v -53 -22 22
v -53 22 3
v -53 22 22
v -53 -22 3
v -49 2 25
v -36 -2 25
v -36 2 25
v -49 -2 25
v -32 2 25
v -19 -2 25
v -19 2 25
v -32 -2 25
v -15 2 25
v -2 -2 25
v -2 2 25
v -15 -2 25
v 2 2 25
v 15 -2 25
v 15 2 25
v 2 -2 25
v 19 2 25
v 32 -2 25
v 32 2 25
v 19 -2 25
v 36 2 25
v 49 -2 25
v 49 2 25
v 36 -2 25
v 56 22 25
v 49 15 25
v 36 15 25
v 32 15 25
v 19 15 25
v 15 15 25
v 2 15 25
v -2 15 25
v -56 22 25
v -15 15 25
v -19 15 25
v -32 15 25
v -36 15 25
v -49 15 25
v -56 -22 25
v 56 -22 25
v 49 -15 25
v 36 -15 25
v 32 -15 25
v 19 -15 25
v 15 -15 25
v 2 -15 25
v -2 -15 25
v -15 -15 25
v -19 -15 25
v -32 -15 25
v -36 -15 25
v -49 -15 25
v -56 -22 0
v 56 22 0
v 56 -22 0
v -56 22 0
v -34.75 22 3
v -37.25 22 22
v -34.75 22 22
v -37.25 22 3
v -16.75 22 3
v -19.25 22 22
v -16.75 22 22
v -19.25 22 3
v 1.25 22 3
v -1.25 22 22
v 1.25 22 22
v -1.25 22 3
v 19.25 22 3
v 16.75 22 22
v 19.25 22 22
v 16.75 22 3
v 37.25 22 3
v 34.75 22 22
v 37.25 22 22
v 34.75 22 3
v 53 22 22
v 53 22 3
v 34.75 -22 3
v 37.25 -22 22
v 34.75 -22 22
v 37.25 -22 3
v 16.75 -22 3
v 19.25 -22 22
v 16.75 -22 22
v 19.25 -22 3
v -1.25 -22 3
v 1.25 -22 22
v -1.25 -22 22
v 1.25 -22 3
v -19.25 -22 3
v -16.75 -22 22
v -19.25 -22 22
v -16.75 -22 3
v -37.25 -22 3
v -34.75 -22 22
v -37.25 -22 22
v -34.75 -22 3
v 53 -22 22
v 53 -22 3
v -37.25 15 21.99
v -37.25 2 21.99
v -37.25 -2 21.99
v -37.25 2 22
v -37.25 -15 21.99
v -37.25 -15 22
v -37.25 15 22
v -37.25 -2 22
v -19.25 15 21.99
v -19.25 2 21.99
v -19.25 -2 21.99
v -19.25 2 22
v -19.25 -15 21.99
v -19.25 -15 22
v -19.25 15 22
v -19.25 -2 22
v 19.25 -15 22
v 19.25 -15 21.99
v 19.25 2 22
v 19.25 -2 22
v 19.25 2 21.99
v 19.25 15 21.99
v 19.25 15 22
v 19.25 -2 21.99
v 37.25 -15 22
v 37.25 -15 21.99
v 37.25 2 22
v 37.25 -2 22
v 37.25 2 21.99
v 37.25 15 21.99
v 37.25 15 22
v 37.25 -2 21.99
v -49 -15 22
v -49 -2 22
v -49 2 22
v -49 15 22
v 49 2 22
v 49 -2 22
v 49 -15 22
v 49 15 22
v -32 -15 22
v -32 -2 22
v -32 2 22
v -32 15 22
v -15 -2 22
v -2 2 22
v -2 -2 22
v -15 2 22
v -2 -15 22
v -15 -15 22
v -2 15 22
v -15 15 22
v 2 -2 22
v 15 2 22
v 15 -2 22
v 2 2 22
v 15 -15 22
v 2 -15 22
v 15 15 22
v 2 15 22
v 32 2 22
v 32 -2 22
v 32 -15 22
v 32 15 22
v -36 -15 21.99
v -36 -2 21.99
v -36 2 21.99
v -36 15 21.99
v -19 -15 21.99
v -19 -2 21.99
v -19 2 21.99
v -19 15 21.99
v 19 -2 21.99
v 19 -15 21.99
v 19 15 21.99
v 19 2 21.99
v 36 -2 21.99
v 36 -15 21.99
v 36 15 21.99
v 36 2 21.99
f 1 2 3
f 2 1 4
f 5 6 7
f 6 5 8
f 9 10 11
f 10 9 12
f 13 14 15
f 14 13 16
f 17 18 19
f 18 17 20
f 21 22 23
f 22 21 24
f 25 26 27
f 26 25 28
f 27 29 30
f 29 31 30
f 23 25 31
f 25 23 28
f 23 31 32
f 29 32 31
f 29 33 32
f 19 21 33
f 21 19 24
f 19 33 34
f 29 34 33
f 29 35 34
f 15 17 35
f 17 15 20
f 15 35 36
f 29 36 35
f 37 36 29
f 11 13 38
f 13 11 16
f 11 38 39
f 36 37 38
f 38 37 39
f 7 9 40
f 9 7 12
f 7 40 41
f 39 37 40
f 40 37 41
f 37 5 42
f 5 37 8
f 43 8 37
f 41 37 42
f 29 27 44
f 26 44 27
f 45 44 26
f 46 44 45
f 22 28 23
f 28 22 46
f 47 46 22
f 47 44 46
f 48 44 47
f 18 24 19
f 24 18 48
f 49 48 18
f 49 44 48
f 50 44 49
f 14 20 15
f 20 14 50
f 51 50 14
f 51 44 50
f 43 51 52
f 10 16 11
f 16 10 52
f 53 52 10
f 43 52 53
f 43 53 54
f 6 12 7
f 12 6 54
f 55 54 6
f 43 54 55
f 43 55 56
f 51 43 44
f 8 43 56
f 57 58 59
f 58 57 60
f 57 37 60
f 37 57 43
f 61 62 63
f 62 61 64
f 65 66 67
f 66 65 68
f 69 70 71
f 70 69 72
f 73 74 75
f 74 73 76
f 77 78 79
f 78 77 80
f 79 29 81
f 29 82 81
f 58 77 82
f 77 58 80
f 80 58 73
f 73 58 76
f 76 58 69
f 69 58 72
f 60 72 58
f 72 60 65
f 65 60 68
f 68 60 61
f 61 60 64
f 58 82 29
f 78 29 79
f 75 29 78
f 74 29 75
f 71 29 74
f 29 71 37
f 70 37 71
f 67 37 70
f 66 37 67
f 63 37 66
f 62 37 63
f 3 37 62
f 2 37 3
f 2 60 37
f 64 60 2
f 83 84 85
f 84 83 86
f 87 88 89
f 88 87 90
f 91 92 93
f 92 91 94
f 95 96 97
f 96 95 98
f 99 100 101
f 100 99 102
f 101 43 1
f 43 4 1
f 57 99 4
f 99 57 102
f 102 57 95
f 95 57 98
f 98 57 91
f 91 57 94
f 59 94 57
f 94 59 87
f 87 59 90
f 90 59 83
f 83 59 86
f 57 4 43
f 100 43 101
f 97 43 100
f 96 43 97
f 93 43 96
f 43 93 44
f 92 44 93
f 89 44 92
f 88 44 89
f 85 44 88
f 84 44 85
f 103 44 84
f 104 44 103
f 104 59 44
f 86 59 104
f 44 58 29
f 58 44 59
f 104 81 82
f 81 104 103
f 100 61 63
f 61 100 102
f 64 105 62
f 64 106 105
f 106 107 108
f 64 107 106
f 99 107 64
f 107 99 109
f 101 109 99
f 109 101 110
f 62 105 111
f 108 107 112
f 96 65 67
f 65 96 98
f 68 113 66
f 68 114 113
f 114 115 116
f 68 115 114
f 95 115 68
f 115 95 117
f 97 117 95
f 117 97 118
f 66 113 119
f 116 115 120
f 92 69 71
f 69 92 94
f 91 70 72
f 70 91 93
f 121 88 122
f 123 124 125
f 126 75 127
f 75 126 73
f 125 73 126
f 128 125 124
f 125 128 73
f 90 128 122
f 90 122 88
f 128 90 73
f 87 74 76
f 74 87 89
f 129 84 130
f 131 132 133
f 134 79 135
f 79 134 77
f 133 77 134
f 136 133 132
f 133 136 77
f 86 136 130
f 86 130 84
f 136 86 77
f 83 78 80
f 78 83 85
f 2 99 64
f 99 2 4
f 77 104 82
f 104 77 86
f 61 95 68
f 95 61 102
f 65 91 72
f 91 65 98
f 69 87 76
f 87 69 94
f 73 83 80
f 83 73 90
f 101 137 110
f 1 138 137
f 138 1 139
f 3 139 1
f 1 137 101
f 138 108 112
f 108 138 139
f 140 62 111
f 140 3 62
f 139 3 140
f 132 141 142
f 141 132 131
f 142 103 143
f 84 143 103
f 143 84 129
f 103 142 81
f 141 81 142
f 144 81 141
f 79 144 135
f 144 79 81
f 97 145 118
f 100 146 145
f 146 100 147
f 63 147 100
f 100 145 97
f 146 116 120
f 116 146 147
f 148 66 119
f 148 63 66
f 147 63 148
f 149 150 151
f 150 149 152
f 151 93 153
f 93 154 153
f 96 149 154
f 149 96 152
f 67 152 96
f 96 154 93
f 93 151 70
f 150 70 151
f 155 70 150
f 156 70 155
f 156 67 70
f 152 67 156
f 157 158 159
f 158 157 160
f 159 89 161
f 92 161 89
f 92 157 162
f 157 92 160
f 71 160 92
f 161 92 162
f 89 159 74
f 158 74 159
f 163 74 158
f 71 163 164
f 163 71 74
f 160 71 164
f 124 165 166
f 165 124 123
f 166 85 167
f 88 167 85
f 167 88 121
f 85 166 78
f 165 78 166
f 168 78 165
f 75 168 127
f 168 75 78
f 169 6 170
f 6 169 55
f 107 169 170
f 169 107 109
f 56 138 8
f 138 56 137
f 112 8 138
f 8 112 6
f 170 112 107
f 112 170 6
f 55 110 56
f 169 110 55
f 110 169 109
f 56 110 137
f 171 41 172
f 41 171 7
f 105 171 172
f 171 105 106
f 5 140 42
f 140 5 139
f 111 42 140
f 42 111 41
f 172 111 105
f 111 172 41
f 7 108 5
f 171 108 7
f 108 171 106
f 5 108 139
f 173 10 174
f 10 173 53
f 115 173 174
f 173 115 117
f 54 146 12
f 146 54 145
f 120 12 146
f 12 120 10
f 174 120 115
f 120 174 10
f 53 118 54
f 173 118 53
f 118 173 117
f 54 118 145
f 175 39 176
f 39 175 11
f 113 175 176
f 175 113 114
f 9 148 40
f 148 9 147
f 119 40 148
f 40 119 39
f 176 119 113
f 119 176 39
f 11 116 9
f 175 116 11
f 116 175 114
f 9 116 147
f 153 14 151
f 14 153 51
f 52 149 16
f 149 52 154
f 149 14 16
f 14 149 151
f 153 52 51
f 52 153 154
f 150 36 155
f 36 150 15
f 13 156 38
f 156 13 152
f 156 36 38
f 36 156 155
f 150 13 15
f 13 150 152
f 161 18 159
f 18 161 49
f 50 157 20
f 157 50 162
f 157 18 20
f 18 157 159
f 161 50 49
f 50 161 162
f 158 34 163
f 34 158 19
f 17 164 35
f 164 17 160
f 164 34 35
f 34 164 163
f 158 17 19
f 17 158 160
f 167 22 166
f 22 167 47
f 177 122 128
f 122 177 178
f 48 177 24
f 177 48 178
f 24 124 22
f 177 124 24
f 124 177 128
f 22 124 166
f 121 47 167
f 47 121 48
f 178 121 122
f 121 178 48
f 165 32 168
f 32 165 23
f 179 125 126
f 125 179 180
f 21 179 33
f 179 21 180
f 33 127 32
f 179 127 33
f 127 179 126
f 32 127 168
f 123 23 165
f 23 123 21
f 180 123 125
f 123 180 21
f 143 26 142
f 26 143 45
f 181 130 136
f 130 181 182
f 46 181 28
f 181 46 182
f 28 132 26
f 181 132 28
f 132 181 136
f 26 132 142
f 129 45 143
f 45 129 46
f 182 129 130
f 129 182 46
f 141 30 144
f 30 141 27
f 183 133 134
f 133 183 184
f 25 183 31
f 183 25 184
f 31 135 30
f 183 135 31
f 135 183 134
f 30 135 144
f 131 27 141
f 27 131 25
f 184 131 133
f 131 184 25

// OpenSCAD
// KNOWN-WRONG PART (must fail): the holes are 17 mm apart instead of 18
// Open-sided rack for 12 standard 12.5 mm square cuvettes (2 rows of 6)
// Category: benchware. A base plate and a perforated deck joined by seven upright walls that run
// front to back; the long sides stay open, so the cuvettes can be seen and read in the rack.
// The deck bridges only 15.5 mm between walls, so it prints without supports.
// Print: PLA or PETG, base on the bed, 0.2 mm layers.
// SPDX-License-Identifier: CERN-OHL-P-2.0

/* [Rack] */
plate = [112, 44];        // X, Y of the base plate and the deck [mm]
base_t = 3;               // base plate z = 0 .. 3
deck_z = 22;              // deck from z = 22 ...
deck_t = 3;               // ... to z = 25
end_t = 3;                // end walls, flush with the short ends
rib_t = 2.5;              // inner ribs
rib_x = [-36, -18, 0, 18, 36];
cols = 6;                 // holes along X
rows = 2;                 // holes along Y
pitch = 17;               // centre-to-centre in X and Y
hole = 13;                // square hole for a 12.5 mm cuvette

/* [Hidden] */
eps = 0.01;
H = deck_z + deck_t;

difference() {
    union() {
        translate([-plate.x / 2, -plate.y / 2, 0]) cube([plate.x, plate.y, base_t]);
        translate([-plate.x / 2, -plate.y / 2, deck_z]) cube([plate.x, plate.y, deck_t]);
        for (s = [-1, 1])
            translate([s > 0 ? plate.x / 2 - end_t : -plate.x / 2, -plate.y / 2, 0]) cube([end_t, plate.y, H]);
        for (x = rib_x)
            translate([x - rib_t / 2, -plate.y / 2, 0]) cube([rib_t, plate.y, H]);
    }
    for (i = [0 : cols - 1], j = [0 : rows - 1])
        translate([(i - (cols - 1) / 2) * pitch - hole / 2, (j - (rows - 1) / 2) * pitch - hole / 2, deck_z - eps])
            cube([hole, hole, deck_t + 2 * eps]);
}
